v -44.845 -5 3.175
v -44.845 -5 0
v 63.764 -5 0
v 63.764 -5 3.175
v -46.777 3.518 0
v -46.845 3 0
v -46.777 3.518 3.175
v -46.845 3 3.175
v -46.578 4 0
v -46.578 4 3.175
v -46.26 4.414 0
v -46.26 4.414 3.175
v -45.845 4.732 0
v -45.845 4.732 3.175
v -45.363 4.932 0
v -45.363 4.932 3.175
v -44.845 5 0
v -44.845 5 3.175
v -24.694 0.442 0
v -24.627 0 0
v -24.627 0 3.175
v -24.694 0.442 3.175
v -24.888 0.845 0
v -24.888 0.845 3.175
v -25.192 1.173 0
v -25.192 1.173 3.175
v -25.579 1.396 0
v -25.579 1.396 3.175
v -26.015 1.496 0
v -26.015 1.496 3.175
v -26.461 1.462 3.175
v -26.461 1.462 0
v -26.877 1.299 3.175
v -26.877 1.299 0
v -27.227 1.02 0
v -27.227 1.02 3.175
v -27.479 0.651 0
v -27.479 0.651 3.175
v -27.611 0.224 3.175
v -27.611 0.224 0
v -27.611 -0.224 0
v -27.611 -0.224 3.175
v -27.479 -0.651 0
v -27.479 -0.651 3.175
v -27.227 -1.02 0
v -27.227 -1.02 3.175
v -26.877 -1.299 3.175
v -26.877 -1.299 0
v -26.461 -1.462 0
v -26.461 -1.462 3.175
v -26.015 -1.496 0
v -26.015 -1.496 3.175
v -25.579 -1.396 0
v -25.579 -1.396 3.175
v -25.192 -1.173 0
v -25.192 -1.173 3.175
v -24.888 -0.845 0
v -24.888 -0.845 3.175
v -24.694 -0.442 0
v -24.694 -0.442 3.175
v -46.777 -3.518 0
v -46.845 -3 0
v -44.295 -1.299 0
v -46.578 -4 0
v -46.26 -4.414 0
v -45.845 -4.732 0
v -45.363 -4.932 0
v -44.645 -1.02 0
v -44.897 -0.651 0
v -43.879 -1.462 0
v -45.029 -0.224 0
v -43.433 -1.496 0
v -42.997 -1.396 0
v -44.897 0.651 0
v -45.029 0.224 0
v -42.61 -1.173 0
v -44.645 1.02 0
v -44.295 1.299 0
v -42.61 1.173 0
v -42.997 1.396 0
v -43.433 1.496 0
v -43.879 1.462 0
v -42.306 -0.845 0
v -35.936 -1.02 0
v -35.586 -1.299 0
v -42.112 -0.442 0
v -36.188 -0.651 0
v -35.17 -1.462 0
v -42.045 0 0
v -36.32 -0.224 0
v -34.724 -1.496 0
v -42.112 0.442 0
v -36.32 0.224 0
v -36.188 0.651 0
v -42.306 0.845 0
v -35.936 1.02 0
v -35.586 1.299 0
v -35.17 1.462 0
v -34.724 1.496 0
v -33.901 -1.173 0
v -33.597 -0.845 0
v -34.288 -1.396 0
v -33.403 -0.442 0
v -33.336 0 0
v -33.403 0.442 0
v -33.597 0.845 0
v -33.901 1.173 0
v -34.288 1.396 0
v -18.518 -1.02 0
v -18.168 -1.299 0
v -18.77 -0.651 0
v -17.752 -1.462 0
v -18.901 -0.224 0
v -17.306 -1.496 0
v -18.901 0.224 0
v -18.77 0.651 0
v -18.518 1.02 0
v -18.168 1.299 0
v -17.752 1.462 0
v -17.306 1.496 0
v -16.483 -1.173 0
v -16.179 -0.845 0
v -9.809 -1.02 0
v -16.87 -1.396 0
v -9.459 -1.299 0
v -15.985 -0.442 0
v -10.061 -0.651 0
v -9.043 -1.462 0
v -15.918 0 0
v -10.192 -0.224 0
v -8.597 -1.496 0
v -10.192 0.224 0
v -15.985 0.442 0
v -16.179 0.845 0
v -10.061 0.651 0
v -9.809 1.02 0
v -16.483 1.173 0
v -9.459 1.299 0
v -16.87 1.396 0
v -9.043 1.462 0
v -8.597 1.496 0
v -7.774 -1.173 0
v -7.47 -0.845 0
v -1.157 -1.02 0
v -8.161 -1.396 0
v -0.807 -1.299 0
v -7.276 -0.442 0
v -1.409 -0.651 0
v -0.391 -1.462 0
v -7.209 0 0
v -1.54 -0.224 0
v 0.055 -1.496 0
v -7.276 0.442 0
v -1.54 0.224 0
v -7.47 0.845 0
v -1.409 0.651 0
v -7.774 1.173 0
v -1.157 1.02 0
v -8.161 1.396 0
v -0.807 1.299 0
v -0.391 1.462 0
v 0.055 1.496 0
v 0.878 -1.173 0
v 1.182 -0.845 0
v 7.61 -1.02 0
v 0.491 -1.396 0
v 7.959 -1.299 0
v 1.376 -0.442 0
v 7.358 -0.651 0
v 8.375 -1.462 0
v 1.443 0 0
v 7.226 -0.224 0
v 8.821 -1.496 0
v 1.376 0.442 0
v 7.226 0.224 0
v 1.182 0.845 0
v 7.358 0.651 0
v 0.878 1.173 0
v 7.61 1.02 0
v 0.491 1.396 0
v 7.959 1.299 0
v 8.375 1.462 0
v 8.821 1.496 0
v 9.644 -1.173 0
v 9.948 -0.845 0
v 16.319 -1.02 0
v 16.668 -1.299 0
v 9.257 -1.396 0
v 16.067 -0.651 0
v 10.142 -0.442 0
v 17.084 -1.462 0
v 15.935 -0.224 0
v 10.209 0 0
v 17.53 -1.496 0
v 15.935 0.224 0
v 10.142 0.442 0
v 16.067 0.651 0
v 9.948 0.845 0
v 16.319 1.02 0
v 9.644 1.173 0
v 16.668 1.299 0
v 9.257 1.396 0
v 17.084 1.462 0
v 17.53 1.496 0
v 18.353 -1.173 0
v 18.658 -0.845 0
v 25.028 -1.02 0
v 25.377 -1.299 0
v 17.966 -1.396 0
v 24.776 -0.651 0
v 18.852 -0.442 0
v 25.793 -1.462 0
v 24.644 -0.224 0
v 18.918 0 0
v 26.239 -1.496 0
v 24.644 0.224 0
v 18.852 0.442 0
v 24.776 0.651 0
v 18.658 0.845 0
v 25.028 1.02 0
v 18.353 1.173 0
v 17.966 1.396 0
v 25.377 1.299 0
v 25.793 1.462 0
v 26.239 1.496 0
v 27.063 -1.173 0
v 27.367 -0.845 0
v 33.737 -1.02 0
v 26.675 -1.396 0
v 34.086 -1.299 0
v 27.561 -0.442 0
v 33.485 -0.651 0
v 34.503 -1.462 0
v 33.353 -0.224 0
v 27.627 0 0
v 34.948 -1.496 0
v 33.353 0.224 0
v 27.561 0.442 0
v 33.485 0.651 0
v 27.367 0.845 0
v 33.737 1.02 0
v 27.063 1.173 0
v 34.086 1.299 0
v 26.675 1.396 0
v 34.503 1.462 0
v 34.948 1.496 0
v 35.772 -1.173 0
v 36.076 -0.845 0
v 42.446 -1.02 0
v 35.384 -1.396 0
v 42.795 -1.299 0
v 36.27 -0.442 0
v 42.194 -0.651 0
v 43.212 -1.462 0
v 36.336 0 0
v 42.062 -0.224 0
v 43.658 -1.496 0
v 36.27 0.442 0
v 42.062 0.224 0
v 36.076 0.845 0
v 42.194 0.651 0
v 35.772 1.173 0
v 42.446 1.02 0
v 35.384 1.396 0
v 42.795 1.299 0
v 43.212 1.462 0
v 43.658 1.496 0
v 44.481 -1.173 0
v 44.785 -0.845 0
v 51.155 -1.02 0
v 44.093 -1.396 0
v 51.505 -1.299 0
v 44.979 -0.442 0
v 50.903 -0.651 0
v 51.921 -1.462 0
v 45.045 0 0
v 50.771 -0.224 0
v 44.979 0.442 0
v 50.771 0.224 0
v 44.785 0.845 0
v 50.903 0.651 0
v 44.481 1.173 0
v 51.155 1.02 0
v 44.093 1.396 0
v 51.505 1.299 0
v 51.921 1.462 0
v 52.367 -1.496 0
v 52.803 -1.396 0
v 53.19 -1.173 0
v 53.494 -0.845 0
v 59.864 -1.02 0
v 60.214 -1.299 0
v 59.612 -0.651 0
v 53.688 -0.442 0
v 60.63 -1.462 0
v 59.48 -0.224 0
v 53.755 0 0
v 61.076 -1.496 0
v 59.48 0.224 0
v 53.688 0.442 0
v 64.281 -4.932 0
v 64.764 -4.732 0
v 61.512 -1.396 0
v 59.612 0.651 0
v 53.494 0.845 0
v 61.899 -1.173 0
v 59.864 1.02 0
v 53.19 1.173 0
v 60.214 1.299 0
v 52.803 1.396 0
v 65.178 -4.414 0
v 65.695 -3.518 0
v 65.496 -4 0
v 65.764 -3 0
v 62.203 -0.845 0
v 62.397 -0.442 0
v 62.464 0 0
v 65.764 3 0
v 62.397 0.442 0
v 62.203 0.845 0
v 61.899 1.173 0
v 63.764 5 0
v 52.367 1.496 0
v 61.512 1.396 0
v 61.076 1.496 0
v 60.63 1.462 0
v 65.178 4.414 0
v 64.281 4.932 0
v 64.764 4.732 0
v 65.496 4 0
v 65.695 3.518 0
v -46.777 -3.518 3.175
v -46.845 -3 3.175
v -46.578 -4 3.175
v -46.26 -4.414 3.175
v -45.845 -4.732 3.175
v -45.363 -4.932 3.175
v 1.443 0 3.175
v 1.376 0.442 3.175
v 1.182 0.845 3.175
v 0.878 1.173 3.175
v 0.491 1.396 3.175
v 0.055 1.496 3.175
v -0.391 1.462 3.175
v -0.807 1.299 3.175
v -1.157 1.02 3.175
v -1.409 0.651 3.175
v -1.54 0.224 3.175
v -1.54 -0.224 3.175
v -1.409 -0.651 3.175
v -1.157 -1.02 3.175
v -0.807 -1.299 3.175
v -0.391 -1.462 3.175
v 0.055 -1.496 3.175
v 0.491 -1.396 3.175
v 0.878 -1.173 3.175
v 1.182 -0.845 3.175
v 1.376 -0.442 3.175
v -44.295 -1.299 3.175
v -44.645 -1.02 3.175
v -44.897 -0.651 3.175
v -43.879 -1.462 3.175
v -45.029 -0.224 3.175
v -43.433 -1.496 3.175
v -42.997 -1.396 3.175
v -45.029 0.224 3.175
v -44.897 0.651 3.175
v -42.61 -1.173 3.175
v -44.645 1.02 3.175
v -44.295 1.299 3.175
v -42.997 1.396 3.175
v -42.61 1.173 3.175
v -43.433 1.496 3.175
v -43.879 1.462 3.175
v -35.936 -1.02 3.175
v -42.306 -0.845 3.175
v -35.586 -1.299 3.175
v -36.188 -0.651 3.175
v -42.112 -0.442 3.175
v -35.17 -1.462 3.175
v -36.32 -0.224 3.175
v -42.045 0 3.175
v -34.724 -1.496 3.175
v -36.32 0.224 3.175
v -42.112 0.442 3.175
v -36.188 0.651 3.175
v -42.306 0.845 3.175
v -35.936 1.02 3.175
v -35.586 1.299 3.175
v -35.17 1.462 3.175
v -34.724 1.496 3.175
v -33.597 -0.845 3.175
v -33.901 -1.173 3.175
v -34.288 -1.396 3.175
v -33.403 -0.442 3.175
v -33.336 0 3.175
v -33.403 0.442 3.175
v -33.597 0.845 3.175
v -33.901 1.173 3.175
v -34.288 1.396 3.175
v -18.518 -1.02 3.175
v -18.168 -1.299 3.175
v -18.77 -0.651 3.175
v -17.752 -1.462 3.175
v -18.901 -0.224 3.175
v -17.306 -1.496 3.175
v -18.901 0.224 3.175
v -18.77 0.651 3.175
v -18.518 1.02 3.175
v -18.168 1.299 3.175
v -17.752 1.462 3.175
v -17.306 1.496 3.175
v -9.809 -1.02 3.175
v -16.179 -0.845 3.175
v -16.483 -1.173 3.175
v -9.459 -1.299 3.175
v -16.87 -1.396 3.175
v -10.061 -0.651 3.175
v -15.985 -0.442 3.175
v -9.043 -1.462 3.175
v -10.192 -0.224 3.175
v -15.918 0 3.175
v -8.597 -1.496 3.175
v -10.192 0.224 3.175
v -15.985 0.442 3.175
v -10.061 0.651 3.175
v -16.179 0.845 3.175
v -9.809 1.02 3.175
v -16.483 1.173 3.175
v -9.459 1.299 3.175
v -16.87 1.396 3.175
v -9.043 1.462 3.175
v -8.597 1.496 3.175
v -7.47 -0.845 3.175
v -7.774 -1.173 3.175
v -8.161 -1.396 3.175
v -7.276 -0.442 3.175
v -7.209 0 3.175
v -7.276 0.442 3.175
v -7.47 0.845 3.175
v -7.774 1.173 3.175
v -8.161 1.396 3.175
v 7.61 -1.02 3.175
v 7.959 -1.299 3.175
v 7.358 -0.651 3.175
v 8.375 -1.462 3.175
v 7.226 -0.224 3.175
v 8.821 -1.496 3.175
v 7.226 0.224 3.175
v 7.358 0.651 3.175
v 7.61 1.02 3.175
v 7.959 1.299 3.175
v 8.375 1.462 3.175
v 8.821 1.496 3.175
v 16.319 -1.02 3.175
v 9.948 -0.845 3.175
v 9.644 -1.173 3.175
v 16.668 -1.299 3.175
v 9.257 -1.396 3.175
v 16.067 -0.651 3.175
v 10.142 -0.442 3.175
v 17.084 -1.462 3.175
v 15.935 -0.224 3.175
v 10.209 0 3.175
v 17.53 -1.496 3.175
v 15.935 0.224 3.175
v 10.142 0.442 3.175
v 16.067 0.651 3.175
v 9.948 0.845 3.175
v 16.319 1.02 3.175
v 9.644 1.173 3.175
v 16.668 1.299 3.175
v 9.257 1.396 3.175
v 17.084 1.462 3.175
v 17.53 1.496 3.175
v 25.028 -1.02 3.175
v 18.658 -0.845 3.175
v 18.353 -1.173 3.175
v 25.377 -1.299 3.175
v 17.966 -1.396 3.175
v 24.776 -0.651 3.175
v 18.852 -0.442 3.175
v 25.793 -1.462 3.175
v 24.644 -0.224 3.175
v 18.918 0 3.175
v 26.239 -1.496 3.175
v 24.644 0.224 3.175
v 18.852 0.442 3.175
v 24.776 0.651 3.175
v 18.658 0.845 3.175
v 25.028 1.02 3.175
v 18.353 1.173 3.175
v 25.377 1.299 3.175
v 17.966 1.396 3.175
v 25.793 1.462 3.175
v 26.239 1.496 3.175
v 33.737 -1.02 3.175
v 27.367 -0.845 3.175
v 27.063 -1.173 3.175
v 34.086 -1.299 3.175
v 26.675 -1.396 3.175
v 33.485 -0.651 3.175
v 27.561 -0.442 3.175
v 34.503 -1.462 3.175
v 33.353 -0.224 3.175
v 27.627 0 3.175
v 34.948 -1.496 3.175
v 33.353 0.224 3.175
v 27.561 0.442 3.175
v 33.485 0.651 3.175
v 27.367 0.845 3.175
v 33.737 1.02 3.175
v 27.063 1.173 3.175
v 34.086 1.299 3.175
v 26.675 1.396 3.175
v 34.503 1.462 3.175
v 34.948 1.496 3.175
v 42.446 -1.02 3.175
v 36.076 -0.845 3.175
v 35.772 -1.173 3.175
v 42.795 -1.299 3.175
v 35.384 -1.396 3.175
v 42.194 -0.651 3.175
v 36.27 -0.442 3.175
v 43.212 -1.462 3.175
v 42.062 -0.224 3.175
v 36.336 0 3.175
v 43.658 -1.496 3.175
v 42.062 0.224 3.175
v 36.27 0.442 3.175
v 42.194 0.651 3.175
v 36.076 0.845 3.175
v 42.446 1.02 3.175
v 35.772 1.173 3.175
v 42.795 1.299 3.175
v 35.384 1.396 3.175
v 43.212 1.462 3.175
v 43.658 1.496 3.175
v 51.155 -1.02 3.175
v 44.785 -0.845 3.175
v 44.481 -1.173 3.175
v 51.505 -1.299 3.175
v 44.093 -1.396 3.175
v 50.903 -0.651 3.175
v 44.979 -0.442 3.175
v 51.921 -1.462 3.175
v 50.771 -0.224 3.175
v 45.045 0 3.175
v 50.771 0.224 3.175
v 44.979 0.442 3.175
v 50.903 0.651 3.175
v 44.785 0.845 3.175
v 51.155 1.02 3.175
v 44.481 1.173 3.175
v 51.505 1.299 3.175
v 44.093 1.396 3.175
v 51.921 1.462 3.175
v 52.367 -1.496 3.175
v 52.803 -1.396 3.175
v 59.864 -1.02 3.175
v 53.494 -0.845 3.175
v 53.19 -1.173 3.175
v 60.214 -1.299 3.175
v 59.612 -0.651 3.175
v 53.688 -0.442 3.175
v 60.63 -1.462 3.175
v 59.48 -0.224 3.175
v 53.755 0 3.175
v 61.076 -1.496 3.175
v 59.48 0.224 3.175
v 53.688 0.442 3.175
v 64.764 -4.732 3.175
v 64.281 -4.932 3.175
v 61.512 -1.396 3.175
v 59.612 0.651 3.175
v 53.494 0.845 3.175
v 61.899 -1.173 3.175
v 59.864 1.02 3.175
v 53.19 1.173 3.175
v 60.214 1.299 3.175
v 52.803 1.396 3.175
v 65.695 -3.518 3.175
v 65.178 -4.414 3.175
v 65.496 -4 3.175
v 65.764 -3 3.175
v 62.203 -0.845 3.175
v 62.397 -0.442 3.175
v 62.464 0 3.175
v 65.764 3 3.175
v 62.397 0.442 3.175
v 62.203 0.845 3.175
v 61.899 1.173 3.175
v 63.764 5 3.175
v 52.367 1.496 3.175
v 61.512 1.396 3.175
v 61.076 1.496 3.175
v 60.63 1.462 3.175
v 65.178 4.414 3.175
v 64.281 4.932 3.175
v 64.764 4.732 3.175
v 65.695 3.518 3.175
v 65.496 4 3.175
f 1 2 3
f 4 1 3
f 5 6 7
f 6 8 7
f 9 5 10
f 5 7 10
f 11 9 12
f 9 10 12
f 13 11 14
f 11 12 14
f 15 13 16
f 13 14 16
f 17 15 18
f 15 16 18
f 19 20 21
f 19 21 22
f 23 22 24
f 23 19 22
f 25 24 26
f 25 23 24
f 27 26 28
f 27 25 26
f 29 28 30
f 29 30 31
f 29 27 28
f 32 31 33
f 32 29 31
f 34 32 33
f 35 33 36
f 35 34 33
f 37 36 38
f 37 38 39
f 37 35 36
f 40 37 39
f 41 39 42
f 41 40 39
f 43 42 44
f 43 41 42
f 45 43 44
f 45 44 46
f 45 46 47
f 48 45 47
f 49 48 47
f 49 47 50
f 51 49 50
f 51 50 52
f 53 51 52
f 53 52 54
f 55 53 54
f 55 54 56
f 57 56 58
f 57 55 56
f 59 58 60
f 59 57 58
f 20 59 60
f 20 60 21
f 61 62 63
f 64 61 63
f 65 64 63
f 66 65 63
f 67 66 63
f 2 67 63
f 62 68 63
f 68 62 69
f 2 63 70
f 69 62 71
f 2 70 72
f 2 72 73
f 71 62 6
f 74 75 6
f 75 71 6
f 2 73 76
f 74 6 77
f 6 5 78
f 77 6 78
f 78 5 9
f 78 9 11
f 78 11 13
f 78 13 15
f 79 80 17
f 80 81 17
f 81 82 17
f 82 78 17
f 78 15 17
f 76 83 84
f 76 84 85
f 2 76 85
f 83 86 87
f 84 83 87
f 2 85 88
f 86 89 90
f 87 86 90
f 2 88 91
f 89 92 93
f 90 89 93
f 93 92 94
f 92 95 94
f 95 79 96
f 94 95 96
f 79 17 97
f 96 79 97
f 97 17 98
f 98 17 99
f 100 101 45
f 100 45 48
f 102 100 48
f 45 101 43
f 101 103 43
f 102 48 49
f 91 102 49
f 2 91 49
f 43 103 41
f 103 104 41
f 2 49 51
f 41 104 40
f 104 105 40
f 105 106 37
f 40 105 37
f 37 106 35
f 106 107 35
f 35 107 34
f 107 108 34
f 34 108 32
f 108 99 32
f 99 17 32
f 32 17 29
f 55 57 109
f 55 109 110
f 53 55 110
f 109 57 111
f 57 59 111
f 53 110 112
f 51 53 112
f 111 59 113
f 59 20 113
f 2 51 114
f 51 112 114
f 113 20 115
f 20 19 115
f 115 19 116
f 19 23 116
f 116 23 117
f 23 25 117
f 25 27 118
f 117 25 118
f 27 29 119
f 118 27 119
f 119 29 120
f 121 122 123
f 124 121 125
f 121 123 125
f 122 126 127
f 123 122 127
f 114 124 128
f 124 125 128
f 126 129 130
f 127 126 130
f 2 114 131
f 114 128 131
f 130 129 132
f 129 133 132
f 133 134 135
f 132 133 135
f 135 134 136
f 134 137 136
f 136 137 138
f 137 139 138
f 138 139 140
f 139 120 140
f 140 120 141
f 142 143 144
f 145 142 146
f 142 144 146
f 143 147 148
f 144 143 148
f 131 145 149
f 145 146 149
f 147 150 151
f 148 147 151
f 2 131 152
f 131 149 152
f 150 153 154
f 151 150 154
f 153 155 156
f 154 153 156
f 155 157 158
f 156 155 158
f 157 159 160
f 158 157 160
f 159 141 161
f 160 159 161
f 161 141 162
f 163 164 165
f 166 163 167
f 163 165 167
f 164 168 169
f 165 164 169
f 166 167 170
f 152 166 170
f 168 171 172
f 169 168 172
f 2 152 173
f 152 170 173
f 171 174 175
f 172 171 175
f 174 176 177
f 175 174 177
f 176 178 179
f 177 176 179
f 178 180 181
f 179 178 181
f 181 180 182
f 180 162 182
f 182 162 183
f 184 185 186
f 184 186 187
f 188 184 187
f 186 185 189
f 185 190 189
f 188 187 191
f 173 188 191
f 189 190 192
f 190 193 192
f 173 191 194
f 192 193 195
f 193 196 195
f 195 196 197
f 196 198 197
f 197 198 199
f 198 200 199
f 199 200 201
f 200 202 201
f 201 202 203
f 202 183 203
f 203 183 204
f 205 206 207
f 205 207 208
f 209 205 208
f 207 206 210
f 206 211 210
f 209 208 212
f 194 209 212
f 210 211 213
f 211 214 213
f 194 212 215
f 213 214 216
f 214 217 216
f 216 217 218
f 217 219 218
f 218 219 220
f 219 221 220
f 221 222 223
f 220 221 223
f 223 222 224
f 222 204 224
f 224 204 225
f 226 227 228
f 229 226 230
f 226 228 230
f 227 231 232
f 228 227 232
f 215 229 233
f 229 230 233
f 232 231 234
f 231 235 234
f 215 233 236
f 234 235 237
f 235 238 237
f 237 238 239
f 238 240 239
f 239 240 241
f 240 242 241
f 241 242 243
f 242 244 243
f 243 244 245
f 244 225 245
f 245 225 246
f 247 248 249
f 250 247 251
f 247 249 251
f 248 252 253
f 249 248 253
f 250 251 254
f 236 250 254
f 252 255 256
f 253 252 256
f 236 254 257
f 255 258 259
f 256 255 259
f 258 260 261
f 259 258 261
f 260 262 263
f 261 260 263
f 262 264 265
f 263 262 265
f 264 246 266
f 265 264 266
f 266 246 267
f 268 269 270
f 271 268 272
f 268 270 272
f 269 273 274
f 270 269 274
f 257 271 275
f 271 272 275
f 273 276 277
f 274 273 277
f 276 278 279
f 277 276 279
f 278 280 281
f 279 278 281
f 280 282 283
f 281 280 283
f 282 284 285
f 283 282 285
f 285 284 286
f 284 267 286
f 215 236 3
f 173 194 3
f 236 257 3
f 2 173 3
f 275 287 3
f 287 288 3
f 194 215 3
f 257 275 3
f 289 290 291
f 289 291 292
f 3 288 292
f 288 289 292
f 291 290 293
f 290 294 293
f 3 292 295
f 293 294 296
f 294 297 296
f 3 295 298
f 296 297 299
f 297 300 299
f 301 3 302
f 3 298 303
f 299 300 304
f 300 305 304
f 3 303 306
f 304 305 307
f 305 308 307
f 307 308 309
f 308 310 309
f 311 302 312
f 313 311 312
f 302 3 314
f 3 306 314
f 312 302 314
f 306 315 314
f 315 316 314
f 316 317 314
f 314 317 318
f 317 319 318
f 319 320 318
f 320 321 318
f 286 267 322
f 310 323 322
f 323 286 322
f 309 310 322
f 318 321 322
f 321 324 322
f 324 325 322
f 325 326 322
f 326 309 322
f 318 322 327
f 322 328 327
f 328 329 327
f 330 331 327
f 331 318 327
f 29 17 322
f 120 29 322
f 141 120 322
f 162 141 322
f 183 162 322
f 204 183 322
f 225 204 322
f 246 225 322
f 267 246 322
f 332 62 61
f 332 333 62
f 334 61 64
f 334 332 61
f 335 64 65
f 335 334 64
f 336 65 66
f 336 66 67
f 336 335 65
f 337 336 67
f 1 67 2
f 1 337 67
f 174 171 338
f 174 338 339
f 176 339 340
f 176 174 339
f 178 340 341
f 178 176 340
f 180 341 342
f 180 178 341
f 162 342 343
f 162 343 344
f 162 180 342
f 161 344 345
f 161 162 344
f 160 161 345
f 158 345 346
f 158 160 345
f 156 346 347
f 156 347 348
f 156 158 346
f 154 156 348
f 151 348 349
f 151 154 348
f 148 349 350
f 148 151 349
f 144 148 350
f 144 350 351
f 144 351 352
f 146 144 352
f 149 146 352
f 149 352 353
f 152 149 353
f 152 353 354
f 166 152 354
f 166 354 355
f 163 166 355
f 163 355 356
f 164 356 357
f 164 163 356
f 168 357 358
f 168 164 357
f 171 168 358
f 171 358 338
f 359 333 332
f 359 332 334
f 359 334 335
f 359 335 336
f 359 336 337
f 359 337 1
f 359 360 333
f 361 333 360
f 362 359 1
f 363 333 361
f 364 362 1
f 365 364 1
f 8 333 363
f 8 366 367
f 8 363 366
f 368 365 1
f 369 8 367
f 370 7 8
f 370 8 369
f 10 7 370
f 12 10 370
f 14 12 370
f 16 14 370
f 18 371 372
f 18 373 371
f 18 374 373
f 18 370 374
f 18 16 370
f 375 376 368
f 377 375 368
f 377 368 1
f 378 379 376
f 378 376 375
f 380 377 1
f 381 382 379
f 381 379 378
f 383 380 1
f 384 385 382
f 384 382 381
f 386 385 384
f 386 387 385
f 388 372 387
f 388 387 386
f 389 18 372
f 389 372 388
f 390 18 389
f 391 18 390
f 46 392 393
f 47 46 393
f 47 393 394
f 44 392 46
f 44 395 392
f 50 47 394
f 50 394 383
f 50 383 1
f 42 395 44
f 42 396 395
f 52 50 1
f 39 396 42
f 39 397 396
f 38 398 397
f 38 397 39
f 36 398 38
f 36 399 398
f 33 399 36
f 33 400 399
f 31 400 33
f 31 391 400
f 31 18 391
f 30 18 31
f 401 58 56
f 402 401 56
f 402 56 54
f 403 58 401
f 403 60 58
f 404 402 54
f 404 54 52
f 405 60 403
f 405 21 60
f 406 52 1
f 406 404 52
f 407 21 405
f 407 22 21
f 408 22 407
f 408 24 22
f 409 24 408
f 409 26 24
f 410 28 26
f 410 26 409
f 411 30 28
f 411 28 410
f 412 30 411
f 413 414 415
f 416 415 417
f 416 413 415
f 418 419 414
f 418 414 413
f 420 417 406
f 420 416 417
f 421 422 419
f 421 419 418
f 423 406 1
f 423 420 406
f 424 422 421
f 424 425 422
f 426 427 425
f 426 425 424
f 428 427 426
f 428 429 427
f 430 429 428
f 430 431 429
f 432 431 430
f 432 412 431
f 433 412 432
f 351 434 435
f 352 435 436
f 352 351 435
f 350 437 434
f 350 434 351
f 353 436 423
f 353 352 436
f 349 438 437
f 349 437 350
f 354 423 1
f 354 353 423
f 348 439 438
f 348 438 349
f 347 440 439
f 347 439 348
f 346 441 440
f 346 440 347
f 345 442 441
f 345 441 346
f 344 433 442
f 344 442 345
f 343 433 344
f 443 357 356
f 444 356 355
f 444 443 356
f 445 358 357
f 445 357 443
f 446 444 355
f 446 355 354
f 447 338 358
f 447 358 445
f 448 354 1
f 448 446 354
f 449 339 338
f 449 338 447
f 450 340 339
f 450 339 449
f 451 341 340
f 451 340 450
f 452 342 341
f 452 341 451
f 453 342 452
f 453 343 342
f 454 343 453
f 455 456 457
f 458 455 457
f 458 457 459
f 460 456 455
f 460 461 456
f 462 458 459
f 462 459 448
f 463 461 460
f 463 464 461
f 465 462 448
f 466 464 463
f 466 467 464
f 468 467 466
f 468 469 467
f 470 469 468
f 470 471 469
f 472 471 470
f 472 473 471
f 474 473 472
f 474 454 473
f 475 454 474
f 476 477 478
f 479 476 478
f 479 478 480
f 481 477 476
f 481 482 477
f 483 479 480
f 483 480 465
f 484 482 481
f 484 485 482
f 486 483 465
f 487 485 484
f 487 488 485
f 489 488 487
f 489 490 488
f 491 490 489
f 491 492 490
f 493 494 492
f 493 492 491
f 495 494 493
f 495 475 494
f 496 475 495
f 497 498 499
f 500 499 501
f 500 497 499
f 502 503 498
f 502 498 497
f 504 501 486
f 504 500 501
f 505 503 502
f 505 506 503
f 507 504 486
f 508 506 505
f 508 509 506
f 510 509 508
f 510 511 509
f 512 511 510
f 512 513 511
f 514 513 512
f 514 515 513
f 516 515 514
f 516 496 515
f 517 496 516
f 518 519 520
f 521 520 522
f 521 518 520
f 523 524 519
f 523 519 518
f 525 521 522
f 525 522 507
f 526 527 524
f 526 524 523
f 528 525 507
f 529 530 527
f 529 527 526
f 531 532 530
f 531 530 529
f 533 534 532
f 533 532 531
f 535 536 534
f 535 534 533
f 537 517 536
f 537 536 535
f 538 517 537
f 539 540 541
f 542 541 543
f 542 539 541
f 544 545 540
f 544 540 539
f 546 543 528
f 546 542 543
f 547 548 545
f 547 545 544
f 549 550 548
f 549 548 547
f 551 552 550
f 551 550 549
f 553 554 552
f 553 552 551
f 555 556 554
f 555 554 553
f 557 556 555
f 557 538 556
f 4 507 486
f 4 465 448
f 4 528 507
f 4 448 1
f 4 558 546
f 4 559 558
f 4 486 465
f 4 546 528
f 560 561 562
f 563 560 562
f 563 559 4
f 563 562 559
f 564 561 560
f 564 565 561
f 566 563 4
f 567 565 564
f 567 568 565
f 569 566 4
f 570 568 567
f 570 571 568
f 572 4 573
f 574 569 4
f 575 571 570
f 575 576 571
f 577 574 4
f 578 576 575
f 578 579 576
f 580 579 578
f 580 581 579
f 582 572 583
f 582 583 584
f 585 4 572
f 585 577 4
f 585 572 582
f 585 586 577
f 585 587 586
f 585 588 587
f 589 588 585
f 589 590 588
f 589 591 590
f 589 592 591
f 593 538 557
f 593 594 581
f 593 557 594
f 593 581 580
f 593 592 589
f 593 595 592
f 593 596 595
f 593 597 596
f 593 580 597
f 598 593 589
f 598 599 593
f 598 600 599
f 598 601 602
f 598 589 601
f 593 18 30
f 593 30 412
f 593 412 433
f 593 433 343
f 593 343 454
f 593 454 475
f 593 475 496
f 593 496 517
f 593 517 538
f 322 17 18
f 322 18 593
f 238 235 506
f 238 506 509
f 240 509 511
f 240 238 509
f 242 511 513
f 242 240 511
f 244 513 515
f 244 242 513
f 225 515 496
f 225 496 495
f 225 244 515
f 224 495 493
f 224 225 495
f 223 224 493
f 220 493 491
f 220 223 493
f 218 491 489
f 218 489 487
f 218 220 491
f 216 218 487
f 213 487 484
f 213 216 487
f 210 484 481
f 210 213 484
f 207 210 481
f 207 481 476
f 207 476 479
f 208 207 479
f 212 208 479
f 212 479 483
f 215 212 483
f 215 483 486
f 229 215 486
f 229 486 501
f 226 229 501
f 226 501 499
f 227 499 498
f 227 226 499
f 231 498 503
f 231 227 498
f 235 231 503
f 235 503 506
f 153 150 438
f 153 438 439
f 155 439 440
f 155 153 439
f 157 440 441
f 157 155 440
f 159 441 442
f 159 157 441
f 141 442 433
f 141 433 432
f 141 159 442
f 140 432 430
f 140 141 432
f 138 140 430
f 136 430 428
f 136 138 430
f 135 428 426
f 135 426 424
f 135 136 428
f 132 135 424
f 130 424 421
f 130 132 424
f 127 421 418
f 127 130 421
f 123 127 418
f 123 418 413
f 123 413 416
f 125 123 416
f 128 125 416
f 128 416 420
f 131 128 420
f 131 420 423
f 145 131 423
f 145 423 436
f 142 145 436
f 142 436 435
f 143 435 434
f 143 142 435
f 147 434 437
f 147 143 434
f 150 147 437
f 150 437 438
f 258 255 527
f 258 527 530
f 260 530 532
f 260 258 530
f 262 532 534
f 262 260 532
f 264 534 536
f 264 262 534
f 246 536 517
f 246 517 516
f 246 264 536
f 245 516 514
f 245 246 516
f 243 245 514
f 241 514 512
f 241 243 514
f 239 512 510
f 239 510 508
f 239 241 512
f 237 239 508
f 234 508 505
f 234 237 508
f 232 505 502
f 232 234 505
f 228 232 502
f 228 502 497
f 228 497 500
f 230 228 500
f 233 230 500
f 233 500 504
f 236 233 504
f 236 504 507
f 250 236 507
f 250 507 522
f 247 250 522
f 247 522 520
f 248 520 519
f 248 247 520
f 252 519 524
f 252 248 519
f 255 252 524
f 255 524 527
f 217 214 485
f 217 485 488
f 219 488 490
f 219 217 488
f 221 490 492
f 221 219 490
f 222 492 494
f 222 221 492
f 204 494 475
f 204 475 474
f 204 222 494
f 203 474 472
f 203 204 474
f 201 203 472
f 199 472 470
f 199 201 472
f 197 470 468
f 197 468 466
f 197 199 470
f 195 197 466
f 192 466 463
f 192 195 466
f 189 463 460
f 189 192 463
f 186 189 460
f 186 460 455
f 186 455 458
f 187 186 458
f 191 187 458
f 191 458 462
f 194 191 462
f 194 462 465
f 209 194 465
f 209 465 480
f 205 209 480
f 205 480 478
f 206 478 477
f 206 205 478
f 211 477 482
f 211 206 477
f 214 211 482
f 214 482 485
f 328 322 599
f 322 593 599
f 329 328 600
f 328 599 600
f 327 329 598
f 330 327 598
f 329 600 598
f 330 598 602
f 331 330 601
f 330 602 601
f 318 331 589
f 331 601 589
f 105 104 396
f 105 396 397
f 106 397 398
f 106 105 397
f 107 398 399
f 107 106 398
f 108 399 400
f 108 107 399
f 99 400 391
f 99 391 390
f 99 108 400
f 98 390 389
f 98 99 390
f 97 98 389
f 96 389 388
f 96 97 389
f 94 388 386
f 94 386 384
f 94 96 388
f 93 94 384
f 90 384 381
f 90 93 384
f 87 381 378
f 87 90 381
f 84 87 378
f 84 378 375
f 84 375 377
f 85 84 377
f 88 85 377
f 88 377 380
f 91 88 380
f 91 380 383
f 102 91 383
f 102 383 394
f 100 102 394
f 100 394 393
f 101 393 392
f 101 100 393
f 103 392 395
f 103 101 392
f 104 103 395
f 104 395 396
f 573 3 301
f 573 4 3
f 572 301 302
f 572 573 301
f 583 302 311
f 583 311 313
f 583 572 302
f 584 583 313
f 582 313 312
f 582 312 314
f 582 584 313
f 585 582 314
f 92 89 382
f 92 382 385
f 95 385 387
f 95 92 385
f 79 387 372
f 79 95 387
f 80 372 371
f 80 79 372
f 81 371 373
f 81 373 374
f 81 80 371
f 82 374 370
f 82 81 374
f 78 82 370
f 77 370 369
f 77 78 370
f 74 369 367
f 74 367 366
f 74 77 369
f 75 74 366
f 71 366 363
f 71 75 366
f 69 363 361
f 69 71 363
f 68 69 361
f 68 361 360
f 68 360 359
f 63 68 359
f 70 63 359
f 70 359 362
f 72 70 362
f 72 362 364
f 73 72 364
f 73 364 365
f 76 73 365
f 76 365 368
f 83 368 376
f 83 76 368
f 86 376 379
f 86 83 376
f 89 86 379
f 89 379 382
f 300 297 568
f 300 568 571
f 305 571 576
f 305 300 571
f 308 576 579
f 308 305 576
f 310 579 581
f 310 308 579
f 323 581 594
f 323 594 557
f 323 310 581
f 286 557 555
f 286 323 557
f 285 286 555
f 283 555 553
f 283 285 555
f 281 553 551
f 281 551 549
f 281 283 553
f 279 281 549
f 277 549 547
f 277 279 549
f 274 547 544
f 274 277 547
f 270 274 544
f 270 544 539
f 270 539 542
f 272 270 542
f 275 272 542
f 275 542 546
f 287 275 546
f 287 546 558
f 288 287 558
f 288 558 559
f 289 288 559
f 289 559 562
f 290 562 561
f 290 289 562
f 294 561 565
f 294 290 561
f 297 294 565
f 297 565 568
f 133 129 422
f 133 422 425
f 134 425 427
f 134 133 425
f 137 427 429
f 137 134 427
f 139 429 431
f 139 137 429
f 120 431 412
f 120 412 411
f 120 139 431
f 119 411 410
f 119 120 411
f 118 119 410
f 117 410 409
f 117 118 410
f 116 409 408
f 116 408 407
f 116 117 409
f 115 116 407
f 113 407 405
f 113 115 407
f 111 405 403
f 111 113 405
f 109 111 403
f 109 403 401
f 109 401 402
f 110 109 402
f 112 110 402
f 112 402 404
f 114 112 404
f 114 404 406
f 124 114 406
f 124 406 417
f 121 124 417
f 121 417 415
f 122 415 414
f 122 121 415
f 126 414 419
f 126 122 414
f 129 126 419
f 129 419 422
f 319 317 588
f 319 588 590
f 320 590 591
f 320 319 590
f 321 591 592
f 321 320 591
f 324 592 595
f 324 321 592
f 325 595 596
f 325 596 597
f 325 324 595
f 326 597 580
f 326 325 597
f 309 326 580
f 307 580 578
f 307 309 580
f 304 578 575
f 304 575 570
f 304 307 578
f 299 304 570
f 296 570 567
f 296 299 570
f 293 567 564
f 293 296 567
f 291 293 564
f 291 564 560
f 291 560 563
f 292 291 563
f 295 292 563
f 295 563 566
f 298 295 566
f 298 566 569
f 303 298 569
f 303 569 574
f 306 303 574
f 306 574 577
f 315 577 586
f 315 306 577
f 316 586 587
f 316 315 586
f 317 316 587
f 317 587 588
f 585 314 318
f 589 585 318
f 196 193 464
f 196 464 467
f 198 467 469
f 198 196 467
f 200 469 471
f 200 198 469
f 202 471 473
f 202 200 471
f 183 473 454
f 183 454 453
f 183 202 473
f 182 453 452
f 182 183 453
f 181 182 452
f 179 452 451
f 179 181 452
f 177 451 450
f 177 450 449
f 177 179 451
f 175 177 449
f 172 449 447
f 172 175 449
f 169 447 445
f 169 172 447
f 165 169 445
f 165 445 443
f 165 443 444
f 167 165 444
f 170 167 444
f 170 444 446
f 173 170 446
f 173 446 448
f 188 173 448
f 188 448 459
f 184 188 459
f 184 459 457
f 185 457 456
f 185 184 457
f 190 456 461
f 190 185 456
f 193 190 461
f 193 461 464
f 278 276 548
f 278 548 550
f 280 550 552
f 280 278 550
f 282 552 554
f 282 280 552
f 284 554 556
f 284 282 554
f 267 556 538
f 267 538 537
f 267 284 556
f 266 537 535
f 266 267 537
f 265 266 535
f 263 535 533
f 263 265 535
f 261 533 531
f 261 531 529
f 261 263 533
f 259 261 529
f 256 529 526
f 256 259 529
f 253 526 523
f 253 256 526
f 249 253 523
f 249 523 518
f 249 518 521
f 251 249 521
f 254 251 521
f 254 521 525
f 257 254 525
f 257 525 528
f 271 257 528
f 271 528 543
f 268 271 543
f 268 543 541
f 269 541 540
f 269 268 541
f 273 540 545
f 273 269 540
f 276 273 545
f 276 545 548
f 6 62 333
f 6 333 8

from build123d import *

# Parameters (mm, degrees)
F0_W     = 112.6090909091
F0_H     = 10
F0_R     = 1.5
F1_DEPTH = 3.175
F2_R     = 2


# Not quite as in the source:
# - a length typed as a fraction of an inch, garbled in the dataset ("3 / 203.2 mm" for 3/8 in), is restored


with BuildPart() as f1:
    # F0 (on Top) → F1 (new body)
    with BuildSketch(Plane.XY):
        with Locations((9.4590909091, 0)):
            Rectangle(F0_W, F0_H)
        with Locations((-43.5454545455, 0)):
            Circle(F0_R, mode=Mode.SUBTRACT)
        with Locations((-34.8363636364, 0)):
            Circle(F0_R, mode=Mode.SUBTRACT)
        with Locations((-26.1272727273, 0)):
            Circle(F0_R, mode=Mode.SUBTRACT)
        with Locations((-17.4181818182, 0)):
            Circle(F0_R, mode=Mode.SUBTRACT)
        with Locations((-8.7090909091, 0)):
            Circle(F0_R, mode=Mode.SUBTRACT)
        with Locations((-0.0571461482, 0)):
            Circle(F0_R, mode=Mode.SUBTRACT)
        with Locations((8.7090909091, 0)):
            Circle(F0_R, mode=Mode.SUBTRACT)
        with Locations((17.4181818182, 0)):
            Circle(F0_R, mode=Mode.SUBTRACT)
        with Locations((26.1272727273, 0)):
            Circle(F0_R, mode=Mode.SUBTRACT)
        with Locations((34.8363636364, 0)):
            Circle(F0_R, mode=Mode.SUBTRACT)
        with Locations((43.5454545455, 0)):
            Circle(F0_R, mode=Mode.SUBTRACT)
        with Locations((52.2545454545, 0)):
            Circle(F0_R, mode=Mode.SUBTRACT)
        with Locations((60.9636363636, 0)):
            Circle(F0_R, mode=Mode.SUBTRACT)
    extrude(amount=F1_DEPTH)

    # F2
    f2_edges = [f1.edges().sort_by_distance(p)[0] for p in [
        (-46.845455, 5, 1.5875),
        (-46.845455, -5, 1.5875),
        (65.763636, 5, 1.5875),
        (65.763636, -5, 1.5875),
    ]]
    fillet(f2_edges, radius=F2_R)


solid = f1.part
